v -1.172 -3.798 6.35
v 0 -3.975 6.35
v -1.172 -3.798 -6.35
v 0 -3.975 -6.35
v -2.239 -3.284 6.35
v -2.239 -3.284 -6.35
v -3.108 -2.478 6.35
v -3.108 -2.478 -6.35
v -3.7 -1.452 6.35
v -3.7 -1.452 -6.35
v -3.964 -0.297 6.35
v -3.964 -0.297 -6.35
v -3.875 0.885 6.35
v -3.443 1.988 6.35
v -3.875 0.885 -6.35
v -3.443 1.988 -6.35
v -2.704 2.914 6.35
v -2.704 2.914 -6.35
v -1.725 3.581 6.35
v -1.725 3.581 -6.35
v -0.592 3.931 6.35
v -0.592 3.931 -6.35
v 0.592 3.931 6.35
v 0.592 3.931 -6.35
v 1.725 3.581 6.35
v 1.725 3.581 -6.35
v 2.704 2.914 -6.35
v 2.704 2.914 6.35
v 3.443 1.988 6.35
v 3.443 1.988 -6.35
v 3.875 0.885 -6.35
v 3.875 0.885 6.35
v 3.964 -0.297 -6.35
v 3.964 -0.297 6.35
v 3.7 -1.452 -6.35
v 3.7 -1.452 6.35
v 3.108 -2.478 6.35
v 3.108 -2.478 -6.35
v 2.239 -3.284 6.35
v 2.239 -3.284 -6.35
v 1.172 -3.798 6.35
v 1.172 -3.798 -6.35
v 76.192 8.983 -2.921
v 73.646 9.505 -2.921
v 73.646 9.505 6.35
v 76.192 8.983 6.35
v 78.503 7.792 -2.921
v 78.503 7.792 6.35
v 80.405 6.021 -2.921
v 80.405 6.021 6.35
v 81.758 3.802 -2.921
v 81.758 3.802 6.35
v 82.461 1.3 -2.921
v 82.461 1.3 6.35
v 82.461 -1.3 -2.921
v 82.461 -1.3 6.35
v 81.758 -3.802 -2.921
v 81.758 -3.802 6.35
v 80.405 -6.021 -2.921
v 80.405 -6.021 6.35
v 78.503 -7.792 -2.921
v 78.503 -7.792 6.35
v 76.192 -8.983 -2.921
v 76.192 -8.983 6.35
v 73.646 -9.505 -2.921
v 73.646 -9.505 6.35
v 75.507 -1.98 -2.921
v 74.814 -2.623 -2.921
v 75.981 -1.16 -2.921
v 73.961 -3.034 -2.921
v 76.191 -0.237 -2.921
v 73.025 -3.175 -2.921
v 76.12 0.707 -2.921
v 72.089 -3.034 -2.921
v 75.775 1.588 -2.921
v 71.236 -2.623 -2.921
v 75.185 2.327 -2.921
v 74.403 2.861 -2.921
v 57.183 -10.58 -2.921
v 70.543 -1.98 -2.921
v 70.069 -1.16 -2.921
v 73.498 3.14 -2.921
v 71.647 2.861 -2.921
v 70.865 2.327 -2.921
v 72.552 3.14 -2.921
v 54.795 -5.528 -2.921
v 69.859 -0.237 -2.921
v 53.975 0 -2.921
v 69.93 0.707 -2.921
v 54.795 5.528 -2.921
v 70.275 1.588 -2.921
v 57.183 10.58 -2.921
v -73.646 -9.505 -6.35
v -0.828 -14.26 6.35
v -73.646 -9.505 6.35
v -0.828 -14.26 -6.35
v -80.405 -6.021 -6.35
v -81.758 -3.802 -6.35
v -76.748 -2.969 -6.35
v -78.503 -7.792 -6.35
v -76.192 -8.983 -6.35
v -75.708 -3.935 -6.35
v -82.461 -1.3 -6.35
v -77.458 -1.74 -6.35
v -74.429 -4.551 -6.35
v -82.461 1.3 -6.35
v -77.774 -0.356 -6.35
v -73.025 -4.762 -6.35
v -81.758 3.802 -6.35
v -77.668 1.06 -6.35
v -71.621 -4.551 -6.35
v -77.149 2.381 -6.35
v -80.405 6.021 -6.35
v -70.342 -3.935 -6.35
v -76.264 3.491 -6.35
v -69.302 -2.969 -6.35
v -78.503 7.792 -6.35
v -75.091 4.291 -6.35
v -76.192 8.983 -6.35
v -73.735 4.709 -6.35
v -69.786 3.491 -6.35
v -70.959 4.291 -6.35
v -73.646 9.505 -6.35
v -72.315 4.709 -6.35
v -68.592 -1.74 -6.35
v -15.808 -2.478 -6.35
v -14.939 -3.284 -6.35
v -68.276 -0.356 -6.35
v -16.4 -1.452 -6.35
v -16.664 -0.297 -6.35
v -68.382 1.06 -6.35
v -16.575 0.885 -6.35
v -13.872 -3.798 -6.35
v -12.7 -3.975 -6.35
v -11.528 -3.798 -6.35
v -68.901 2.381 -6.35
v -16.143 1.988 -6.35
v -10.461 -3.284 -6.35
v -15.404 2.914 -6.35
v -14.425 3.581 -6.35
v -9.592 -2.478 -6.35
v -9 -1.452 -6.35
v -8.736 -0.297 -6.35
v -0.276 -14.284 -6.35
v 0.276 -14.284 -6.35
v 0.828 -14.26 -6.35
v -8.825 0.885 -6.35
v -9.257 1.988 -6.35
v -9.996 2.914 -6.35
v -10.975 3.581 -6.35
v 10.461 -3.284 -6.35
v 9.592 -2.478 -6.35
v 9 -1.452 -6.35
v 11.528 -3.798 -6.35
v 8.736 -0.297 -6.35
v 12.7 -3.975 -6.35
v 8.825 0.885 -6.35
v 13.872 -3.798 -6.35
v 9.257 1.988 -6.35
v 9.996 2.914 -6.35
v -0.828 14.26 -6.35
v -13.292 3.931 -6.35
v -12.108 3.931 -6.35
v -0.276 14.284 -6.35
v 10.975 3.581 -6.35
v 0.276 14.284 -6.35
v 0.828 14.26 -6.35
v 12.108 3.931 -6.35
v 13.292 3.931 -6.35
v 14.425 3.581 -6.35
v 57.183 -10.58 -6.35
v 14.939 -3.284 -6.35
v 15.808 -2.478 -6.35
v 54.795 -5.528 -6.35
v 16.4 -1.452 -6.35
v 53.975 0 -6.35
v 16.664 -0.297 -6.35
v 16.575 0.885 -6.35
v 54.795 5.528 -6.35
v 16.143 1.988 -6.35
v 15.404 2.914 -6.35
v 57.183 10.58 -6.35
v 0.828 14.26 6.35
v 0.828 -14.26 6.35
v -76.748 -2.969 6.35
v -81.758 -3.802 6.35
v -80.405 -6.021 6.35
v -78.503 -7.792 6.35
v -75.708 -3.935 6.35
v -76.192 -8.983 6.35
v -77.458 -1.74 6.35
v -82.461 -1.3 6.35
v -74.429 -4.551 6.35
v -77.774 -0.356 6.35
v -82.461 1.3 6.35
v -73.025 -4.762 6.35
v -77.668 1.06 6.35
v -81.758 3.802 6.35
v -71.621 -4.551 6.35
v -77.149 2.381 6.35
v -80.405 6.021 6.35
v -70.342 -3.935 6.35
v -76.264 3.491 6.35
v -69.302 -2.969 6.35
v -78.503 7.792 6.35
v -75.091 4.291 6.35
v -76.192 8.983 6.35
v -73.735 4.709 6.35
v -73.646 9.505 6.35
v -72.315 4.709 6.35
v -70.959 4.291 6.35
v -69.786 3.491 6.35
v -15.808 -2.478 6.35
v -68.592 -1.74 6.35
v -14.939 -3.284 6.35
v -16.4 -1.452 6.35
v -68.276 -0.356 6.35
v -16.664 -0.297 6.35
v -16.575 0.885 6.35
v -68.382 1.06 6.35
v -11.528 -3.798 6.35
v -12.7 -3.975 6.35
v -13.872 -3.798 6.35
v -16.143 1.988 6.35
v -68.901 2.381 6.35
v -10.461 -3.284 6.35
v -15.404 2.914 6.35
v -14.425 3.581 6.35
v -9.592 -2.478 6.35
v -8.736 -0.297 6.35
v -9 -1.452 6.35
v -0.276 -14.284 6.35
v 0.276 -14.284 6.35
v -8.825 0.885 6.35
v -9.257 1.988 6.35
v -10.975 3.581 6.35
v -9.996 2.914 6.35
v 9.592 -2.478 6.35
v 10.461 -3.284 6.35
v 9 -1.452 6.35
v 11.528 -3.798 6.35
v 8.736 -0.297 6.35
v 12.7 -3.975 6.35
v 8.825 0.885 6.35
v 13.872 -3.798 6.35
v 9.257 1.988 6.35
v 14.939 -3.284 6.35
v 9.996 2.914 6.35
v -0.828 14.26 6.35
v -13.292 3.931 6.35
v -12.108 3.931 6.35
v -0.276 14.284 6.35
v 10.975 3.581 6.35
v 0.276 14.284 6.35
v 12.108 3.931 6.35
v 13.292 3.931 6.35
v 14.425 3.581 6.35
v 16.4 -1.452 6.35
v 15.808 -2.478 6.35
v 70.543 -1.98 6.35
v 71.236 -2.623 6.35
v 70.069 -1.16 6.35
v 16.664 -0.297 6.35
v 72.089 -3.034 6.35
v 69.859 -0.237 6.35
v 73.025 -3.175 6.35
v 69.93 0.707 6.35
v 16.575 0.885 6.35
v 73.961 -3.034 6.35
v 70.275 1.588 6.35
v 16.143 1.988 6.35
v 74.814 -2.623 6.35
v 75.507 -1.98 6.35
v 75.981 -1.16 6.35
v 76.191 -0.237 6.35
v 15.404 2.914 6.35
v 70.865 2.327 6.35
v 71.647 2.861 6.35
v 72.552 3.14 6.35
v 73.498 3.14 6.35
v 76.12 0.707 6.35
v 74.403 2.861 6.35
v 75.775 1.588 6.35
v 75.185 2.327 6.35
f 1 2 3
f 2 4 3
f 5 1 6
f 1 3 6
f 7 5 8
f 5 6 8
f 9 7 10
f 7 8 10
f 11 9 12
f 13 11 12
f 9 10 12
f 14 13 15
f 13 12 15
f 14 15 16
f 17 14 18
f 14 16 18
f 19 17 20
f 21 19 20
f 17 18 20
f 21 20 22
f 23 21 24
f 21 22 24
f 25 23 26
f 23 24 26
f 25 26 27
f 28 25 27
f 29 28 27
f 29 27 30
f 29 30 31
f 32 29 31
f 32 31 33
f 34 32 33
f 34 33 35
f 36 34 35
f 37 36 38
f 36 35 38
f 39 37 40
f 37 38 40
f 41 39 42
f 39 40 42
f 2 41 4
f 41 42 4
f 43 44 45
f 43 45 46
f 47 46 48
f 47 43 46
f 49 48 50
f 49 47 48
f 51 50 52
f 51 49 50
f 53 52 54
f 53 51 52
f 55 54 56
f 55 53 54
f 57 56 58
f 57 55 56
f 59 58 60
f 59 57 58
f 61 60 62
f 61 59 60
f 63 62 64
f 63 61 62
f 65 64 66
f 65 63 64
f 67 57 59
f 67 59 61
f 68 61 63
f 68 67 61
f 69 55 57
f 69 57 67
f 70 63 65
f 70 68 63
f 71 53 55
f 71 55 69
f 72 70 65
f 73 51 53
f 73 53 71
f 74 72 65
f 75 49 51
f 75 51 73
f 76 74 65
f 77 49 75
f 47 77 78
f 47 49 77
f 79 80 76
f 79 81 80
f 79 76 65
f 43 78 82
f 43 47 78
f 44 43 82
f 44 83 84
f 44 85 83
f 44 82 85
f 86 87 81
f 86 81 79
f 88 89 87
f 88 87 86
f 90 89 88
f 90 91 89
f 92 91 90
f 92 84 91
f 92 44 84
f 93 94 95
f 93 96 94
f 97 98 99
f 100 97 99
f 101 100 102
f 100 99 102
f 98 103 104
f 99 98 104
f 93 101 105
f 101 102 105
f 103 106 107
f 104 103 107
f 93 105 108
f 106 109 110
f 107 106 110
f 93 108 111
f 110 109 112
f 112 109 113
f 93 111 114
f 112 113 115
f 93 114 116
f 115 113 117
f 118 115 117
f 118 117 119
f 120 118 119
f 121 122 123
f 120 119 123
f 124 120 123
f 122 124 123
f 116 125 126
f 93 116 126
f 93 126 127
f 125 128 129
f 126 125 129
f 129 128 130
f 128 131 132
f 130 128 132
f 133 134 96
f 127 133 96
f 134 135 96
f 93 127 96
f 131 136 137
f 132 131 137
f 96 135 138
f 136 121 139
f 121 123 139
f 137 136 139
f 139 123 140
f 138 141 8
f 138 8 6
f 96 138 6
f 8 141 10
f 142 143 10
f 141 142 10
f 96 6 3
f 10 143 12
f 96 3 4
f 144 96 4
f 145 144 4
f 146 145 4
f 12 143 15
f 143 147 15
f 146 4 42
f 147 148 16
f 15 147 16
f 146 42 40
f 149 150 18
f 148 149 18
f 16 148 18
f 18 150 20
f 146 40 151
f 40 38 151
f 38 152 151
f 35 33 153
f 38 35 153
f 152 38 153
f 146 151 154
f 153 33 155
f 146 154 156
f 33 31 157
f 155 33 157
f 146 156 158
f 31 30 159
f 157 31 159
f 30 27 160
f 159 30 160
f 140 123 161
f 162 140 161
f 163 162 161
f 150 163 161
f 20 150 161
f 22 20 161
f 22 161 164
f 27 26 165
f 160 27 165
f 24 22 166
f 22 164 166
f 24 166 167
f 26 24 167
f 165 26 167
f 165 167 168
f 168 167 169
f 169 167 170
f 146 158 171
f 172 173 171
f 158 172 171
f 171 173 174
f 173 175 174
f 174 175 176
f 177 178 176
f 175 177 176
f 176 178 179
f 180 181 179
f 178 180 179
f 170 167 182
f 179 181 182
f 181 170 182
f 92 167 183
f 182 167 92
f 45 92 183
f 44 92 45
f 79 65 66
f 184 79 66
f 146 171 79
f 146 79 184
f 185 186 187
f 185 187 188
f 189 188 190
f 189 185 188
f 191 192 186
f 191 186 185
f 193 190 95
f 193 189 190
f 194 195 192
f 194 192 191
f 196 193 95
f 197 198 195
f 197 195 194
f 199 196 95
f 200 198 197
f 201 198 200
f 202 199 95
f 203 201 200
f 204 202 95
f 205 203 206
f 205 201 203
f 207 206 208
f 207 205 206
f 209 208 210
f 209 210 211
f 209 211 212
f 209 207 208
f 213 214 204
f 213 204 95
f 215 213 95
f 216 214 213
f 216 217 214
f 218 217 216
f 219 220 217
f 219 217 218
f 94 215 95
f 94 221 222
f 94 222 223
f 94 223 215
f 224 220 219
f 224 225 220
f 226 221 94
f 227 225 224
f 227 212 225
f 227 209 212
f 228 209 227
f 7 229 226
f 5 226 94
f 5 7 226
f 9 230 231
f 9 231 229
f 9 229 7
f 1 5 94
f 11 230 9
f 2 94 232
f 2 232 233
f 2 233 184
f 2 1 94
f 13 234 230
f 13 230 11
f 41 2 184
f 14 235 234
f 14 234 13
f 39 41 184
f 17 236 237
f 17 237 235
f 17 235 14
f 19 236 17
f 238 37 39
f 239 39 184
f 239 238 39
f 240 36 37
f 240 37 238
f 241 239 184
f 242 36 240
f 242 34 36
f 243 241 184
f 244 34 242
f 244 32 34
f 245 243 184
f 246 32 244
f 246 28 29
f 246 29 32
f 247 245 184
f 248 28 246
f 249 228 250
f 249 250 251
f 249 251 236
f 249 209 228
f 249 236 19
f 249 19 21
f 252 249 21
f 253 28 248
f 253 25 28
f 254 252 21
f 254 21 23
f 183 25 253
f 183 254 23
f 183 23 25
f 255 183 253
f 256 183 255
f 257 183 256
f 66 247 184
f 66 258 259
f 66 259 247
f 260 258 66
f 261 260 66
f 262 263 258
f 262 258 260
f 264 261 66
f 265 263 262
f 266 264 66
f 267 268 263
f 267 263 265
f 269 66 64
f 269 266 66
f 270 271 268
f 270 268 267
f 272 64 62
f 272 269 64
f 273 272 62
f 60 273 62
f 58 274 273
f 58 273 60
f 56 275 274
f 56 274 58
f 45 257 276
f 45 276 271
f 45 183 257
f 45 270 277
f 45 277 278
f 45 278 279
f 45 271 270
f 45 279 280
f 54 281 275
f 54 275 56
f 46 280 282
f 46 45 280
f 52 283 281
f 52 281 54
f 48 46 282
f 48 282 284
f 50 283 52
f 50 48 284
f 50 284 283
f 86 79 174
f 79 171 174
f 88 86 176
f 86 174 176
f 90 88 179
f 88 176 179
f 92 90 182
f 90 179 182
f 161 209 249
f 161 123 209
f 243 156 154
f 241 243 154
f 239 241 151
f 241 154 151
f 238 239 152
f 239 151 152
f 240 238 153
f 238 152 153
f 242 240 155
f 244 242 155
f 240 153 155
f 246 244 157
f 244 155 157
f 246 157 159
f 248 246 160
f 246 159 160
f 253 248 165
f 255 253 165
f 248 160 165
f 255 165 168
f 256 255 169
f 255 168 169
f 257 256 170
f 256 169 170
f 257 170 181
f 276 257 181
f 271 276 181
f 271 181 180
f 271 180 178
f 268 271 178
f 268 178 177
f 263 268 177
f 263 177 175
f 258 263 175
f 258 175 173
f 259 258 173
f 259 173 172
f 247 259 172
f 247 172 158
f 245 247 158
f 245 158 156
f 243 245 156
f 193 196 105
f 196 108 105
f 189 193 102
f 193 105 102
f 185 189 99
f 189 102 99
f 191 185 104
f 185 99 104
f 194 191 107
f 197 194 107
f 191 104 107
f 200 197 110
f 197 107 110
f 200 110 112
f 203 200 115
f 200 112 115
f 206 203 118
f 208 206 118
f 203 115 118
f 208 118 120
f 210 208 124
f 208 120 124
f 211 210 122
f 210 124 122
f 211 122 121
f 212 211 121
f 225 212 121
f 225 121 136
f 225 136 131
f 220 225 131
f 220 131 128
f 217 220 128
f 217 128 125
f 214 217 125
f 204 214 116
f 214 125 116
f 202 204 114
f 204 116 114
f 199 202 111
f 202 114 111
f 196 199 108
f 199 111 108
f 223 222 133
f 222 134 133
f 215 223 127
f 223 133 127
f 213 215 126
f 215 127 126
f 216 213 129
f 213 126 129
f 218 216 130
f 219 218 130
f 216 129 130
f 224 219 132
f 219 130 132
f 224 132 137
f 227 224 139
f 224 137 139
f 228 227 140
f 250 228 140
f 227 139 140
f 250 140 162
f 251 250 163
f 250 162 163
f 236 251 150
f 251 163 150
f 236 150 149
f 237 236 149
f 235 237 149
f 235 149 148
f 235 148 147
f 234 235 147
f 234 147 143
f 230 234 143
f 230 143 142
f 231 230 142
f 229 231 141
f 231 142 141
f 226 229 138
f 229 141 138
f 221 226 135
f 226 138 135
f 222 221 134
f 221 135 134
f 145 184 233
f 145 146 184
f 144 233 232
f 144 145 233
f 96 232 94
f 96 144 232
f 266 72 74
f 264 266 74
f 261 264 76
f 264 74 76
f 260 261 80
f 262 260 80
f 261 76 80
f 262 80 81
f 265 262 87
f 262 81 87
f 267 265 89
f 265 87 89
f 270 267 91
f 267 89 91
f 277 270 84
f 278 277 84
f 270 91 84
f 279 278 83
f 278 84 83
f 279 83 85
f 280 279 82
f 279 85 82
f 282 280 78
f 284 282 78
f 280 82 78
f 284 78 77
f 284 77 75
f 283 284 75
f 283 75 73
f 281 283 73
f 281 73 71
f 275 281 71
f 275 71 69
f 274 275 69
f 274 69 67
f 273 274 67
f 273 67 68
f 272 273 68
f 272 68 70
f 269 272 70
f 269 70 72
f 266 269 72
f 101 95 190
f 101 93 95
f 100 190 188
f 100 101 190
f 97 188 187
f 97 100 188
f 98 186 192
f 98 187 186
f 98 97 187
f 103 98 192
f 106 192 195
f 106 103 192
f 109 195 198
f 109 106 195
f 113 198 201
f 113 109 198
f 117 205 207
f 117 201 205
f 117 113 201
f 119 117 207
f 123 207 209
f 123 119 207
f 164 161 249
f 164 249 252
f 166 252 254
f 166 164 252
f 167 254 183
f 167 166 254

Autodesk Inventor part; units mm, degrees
ref_plane "YZ Plane" through (0, 0, 0) normal (1, 0, 0) x (0, 1, 0)
ref_plane "XZ Plane" through (0, 0, 0) normal (0, 1, 0) x (-1, 0, 0)
ref_plane "XY Plane" through (0, 0, 0) normal (0, 0, 1) x (1, 0, 0)
sketch "Sketch2" plane through (0, 0, 0) normal (0, 0, 1) x (1, 0, 0)
  line L0 (-73.6458, 9.5048) -> (-0.8277, 14.2605)
  arc A0 (0.8277, 14.2605) -> (-0.8277, 14.2605) centre (0, 1.5875) ccw
  line L1 (0.8277, 14.2605) -> (73.6458, 9.5048)
  arc A1 (73.6458, -9.5048) -> (73.6458, 9.5048) centre (73.025, 0) ccw
  line L2 (73.6458, -9.5048) -> (0.8277, -14.2605)
  arc A2 (-0.8277, -14.2605) -> (0.8277, -14.2605) centre (0, -1.5875) ccw
  line L3 (-0.8277, -14.2605) -> (-73.6458, -9.5048)
  arc A3 (-73.6458, 9.5048) -> (-73.6458, -9.5048) centre (-73.025, 0) ccw
  line L4 (-73.025, 0) -> (73.025, 0) construction
  line L5 (0, 20.0025) -> (0, -20.0025) construction
  line L6 (0, 1.5875) -> (0, -1.5875) construction
  point P0 (0, 0)
  point P1 (0, 0)
  dimension "d0" = 3.175
  dimension "d1" = 12.7
  dimension "d2" = 9.525
  dimension "d3" = 146.05
extrude "Extrusion1" add sketch "Sketch2" along normal mid plane 12.7
sketch "Sketch3" plane through (0, 0, 6.35) normal (0, 0, 1) x (1, 0, 0)
  line L0 (-12.7, 0) -> (12.7, 0) construction
  point P0 (0, 0)
  point P1 (0, 0)
  point P2 (0, 0)
  dimension "d6" = 25.4
hole "Hole1" at (0, 0, 6.35) at (-12.7, 0, 6.35) at (12.7, 0, 6.35) direction (0, 0, -1) diameter 7.9502 end through all clearance for "F7 - SLIP FIT" size "5/16" standard "CL-DOWEL-IMP"
sketch "Sketch7" plane through (0, 0, 6.35) normal (0, 0, 1) x (1, 0, 0)
  arc A0 (-73.6458, 9.5048) -> (-73.6458, -9.5048) centre (-73.025, 0) ccw construction
  point P0 (0, 0)
hole "Hole4" at (-73.025, 0, 6.35) direction (0, 0, -1) diameter 9.525 end through all clearance for "H7 - STANDARD FIT" size "3/8" standard "CL-DOWEL-IMP"
sketch "Sketch9" plane through (0, 0, -6.35) normal (0, 0, -1) x (-1, 0, 0)
  circle A0 centre (73.025, 0) radius 4.7625 construction
  circle A1 centre (-12.7, 0) radius 3.9751 construction
  circle A2 centre (12.7, 0) radius 3.9751 construction
  circle A3 centre (0, 0) radius 3.9751 construction
  line L0 (-73.6458, -9.5048) -> (-0.8277, -14.2605) projected
  arc A4 (-0.8277, -14.2605) -> (0.8277, -14.2605) centre (0, -1.5875) ccw construction
  line L1 (0.8277, -14.2605) -> (73.6458, -9.5048) construction
  arc A5 (73.6458, -9.5048) -> (73.6458, 9.5048) centre (73.025, 0) ccw construction
  line L2 (73.6458, 9.5048) -> (0.8277, 14.2605) construction
  arc A6 (0.8277, 14.2605) -> (-0.8277, 14.2605) centre (0, 1.5875) ccw construction
  line L3 (-0.8277, 14.2605) -> (-73.6458, 9.5048) projected
  arc A7 (-73.6458, 9.5048) -> (-73.6458, -9.5048) centre (-73.025, 0) ccw projected
  arc A8 (-57.183, -10.5799) -> (-57.183, 10.5799) centre (-73.025, 0) ccw
  dimension "d48" = 19.05
extrude "Extrusion3" cut sketch "Sketch9" against normal blind 3.429
sketch "Sketch8" plane through (0, 0, 6.35) normal (0, 0, 1) x (1, 0, 0)
  arc A0 (73.6458, -9.5048) -> (73.6458, 9.5048) centre (73.025, 0) ccw construction
  point P0 (0, 0)
  point P1 (73.025, 0)
hole "Hole5" at (73.025, 0, 6.35) direction (0, 0, -1) diameter 6.35 end through all clearance for "F7 - SLIP FIT" size "1/4" standard "CL-DOWEL-IMP"
equation "\"d46\" = d0"
properties part number "PLATE,ROCKER,ELEVATOR" material "Aluminum, 7075-T6"
